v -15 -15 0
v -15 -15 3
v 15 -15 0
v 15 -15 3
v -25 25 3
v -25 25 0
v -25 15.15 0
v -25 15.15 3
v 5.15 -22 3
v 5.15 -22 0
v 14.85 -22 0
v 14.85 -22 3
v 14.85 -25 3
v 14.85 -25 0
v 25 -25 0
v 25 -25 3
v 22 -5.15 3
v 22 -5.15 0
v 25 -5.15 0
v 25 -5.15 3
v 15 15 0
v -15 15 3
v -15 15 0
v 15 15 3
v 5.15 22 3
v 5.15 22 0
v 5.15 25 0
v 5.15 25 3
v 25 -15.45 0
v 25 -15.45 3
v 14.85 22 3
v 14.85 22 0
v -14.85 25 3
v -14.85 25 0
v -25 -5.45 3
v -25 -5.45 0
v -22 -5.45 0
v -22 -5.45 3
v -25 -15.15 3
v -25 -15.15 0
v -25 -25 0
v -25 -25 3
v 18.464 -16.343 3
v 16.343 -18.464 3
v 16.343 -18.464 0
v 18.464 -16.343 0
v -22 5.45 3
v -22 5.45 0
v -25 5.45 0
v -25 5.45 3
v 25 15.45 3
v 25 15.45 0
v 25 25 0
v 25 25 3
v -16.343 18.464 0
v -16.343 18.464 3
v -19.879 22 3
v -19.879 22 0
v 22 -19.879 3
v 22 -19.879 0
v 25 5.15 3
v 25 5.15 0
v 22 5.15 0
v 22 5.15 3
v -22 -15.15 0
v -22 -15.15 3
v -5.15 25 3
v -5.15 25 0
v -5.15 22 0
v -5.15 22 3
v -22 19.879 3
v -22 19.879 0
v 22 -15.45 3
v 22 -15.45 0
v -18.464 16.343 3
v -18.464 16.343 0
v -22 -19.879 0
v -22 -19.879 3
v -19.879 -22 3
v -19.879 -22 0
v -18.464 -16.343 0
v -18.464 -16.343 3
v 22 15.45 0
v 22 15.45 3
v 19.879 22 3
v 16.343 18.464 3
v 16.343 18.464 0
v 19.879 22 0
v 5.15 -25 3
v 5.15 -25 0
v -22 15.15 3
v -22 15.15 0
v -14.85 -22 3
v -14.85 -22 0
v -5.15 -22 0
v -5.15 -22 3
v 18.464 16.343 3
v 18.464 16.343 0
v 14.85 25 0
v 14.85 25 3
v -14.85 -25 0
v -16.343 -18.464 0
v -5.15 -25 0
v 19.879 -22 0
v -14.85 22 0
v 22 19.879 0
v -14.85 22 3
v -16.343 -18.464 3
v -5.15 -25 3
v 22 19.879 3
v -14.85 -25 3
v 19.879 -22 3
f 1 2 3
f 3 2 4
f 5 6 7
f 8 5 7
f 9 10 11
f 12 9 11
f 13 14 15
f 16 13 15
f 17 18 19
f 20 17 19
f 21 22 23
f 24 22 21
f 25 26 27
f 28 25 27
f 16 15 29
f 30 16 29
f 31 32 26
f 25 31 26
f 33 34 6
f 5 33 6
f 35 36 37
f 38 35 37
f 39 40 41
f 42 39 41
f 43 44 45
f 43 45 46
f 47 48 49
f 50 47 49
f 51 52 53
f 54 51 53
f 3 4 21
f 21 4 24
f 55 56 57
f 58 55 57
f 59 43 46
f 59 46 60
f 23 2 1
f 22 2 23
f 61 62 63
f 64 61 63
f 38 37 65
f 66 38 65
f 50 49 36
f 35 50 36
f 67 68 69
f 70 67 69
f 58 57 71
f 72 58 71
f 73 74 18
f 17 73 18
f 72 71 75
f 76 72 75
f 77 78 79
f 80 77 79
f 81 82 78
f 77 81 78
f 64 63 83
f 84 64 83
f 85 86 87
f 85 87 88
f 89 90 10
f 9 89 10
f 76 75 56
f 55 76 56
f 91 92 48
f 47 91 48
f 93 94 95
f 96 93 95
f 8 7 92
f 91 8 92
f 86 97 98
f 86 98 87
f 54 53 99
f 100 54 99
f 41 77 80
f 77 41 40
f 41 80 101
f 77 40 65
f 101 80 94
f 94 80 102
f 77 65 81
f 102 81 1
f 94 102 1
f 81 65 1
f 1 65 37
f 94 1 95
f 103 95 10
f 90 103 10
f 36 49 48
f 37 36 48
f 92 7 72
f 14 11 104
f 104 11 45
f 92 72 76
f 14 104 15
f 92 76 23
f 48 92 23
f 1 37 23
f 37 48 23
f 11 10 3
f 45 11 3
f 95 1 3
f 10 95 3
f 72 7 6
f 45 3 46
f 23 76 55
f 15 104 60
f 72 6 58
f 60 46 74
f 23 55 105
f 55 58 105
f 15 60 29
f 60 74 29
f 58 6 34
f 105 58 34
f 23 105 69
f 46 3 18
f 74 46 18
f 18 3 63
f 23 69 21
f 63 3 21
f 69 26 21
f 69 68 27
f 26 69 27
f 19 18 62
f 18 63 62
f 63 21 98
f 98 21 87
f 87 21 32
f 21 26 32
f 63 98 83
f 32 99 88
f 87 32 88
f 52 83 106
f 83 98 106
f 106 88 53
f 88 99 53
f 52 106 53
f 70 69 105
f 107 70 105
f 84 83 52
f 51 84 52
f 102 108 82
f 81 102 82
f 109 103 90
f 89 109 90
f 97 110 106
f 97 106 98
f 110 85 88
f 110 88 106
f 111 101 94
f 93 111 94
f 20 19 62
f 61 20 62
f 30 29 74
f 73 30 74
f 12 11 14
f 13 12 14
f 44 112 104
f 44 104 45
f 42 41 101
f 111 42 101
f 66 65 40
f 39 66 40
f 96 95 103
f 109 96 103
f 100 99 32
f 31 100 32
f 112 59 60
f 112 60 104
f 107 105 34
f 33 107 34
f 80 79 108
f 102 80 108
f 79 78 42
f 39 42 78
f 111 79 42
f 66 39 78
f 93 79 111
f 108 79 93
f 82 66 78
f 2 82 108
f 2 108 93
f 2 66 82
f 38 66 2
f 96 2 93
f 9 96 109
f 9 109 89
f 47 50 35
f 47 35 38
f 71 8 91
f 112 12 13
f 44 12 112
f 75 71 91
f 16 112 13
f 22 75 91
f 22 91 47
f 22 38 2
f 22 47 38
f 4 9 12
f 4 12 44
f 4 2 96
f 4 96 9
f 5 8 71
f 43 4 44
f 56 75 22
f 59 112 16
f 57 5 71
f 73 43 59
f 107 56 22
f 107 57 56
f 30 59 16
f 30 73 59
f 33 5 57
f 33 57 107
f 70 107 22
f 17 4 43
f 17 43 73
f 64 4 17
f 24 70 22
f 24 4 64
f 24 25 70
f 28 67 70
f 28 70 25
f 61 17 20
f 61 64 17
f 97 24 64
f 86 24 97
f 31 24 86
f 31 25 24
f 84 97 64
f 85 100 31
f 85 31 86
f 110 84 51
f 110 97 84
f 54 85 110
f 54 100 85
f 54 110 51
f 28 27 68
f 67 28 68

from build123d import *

# Parameters (mm, degrees)
SALIENTE_EXTRUIR1_DEPTH = 3
CROQUIS2_W              = 30
CROQUIS2_H              = 30
CORTAR_EXTRUIR2_DEPTH   = 3
CORTAR_EXTRUIR3_DEPTH   = 3


with BuildPart() as part:
    # Croquis1 → Saliente-Extruir1 (new body)
    with BuildSketch(Plane.XY):
        Polygon((-25, -25), (-14.85, -25), (-14.85, -22), (-5.15, -22), (-5.15, -25), (5.15, -25), (5.15, -22), (14.85, -22), (14.85, -25), (25, -25), (25, -15.45), (22, -15.45), (22, -5.15), (25, -5.15), (25, 5.15), (22, 5.15), (22, 15.45), (25, 15.45), (25, 25), (14.85, 25), (14.85, 22), (5.15, 22), (5.15, 25), (-5.15, 25), (-5.15, 22), (-14.85, 22), (-14.85, 25), (-25, 25), (-25, 15.15), (-22, 15.15), (-22, 5.45), (-25, 5.45), (-25, -5.45), (-22, -5.45), (-22, -15.15), (-25, -15.15), align=None)
    extrude(amount=SALIENTE_EXTRUIR1_DEPTH)

    # Croquis2 → Cortar-Extruir2 (cut)
    with BuildSketch(Plane.XY.offset(3)):
        Rectangle(CROQUIS2_W, CROQUIS2_H)
    extrude(amount=-CORTAR_EXTRUIR2_DEPTH, mode=Mode.SUBTRACT)

    # Croquis3 → Cortar-Extruir3 (cut)
    with BuildSketch(Plane.XY.offset(3)):
        Polygon((-19.878679656, -22), (-16.343145751, -18.464466094), (-18.464466094, -16.343145751), (-22, -19.878679656), align=None)
        Polygon((16.343145751, -18.464466094), (18.464466094, -16.343145751), (22, -19.878679656), (19.878679656, -22), align=None)
        Polygon((22, 19.878679656), (18.464466094, 16.343145751), (16.343145751, 18.464466094), (19.878679656, 22), align=None)
        Polygon((-22, 19.878679656), (-18.464466094, 16.343145751), (-16.343145751, 18.464466094), (-19.878679656, 22), align=None)
    extrude(amount=-CORTAR_EXTRUIR3_DEPTH, mode=Mode.SUBTRACT)


solid = part.part
